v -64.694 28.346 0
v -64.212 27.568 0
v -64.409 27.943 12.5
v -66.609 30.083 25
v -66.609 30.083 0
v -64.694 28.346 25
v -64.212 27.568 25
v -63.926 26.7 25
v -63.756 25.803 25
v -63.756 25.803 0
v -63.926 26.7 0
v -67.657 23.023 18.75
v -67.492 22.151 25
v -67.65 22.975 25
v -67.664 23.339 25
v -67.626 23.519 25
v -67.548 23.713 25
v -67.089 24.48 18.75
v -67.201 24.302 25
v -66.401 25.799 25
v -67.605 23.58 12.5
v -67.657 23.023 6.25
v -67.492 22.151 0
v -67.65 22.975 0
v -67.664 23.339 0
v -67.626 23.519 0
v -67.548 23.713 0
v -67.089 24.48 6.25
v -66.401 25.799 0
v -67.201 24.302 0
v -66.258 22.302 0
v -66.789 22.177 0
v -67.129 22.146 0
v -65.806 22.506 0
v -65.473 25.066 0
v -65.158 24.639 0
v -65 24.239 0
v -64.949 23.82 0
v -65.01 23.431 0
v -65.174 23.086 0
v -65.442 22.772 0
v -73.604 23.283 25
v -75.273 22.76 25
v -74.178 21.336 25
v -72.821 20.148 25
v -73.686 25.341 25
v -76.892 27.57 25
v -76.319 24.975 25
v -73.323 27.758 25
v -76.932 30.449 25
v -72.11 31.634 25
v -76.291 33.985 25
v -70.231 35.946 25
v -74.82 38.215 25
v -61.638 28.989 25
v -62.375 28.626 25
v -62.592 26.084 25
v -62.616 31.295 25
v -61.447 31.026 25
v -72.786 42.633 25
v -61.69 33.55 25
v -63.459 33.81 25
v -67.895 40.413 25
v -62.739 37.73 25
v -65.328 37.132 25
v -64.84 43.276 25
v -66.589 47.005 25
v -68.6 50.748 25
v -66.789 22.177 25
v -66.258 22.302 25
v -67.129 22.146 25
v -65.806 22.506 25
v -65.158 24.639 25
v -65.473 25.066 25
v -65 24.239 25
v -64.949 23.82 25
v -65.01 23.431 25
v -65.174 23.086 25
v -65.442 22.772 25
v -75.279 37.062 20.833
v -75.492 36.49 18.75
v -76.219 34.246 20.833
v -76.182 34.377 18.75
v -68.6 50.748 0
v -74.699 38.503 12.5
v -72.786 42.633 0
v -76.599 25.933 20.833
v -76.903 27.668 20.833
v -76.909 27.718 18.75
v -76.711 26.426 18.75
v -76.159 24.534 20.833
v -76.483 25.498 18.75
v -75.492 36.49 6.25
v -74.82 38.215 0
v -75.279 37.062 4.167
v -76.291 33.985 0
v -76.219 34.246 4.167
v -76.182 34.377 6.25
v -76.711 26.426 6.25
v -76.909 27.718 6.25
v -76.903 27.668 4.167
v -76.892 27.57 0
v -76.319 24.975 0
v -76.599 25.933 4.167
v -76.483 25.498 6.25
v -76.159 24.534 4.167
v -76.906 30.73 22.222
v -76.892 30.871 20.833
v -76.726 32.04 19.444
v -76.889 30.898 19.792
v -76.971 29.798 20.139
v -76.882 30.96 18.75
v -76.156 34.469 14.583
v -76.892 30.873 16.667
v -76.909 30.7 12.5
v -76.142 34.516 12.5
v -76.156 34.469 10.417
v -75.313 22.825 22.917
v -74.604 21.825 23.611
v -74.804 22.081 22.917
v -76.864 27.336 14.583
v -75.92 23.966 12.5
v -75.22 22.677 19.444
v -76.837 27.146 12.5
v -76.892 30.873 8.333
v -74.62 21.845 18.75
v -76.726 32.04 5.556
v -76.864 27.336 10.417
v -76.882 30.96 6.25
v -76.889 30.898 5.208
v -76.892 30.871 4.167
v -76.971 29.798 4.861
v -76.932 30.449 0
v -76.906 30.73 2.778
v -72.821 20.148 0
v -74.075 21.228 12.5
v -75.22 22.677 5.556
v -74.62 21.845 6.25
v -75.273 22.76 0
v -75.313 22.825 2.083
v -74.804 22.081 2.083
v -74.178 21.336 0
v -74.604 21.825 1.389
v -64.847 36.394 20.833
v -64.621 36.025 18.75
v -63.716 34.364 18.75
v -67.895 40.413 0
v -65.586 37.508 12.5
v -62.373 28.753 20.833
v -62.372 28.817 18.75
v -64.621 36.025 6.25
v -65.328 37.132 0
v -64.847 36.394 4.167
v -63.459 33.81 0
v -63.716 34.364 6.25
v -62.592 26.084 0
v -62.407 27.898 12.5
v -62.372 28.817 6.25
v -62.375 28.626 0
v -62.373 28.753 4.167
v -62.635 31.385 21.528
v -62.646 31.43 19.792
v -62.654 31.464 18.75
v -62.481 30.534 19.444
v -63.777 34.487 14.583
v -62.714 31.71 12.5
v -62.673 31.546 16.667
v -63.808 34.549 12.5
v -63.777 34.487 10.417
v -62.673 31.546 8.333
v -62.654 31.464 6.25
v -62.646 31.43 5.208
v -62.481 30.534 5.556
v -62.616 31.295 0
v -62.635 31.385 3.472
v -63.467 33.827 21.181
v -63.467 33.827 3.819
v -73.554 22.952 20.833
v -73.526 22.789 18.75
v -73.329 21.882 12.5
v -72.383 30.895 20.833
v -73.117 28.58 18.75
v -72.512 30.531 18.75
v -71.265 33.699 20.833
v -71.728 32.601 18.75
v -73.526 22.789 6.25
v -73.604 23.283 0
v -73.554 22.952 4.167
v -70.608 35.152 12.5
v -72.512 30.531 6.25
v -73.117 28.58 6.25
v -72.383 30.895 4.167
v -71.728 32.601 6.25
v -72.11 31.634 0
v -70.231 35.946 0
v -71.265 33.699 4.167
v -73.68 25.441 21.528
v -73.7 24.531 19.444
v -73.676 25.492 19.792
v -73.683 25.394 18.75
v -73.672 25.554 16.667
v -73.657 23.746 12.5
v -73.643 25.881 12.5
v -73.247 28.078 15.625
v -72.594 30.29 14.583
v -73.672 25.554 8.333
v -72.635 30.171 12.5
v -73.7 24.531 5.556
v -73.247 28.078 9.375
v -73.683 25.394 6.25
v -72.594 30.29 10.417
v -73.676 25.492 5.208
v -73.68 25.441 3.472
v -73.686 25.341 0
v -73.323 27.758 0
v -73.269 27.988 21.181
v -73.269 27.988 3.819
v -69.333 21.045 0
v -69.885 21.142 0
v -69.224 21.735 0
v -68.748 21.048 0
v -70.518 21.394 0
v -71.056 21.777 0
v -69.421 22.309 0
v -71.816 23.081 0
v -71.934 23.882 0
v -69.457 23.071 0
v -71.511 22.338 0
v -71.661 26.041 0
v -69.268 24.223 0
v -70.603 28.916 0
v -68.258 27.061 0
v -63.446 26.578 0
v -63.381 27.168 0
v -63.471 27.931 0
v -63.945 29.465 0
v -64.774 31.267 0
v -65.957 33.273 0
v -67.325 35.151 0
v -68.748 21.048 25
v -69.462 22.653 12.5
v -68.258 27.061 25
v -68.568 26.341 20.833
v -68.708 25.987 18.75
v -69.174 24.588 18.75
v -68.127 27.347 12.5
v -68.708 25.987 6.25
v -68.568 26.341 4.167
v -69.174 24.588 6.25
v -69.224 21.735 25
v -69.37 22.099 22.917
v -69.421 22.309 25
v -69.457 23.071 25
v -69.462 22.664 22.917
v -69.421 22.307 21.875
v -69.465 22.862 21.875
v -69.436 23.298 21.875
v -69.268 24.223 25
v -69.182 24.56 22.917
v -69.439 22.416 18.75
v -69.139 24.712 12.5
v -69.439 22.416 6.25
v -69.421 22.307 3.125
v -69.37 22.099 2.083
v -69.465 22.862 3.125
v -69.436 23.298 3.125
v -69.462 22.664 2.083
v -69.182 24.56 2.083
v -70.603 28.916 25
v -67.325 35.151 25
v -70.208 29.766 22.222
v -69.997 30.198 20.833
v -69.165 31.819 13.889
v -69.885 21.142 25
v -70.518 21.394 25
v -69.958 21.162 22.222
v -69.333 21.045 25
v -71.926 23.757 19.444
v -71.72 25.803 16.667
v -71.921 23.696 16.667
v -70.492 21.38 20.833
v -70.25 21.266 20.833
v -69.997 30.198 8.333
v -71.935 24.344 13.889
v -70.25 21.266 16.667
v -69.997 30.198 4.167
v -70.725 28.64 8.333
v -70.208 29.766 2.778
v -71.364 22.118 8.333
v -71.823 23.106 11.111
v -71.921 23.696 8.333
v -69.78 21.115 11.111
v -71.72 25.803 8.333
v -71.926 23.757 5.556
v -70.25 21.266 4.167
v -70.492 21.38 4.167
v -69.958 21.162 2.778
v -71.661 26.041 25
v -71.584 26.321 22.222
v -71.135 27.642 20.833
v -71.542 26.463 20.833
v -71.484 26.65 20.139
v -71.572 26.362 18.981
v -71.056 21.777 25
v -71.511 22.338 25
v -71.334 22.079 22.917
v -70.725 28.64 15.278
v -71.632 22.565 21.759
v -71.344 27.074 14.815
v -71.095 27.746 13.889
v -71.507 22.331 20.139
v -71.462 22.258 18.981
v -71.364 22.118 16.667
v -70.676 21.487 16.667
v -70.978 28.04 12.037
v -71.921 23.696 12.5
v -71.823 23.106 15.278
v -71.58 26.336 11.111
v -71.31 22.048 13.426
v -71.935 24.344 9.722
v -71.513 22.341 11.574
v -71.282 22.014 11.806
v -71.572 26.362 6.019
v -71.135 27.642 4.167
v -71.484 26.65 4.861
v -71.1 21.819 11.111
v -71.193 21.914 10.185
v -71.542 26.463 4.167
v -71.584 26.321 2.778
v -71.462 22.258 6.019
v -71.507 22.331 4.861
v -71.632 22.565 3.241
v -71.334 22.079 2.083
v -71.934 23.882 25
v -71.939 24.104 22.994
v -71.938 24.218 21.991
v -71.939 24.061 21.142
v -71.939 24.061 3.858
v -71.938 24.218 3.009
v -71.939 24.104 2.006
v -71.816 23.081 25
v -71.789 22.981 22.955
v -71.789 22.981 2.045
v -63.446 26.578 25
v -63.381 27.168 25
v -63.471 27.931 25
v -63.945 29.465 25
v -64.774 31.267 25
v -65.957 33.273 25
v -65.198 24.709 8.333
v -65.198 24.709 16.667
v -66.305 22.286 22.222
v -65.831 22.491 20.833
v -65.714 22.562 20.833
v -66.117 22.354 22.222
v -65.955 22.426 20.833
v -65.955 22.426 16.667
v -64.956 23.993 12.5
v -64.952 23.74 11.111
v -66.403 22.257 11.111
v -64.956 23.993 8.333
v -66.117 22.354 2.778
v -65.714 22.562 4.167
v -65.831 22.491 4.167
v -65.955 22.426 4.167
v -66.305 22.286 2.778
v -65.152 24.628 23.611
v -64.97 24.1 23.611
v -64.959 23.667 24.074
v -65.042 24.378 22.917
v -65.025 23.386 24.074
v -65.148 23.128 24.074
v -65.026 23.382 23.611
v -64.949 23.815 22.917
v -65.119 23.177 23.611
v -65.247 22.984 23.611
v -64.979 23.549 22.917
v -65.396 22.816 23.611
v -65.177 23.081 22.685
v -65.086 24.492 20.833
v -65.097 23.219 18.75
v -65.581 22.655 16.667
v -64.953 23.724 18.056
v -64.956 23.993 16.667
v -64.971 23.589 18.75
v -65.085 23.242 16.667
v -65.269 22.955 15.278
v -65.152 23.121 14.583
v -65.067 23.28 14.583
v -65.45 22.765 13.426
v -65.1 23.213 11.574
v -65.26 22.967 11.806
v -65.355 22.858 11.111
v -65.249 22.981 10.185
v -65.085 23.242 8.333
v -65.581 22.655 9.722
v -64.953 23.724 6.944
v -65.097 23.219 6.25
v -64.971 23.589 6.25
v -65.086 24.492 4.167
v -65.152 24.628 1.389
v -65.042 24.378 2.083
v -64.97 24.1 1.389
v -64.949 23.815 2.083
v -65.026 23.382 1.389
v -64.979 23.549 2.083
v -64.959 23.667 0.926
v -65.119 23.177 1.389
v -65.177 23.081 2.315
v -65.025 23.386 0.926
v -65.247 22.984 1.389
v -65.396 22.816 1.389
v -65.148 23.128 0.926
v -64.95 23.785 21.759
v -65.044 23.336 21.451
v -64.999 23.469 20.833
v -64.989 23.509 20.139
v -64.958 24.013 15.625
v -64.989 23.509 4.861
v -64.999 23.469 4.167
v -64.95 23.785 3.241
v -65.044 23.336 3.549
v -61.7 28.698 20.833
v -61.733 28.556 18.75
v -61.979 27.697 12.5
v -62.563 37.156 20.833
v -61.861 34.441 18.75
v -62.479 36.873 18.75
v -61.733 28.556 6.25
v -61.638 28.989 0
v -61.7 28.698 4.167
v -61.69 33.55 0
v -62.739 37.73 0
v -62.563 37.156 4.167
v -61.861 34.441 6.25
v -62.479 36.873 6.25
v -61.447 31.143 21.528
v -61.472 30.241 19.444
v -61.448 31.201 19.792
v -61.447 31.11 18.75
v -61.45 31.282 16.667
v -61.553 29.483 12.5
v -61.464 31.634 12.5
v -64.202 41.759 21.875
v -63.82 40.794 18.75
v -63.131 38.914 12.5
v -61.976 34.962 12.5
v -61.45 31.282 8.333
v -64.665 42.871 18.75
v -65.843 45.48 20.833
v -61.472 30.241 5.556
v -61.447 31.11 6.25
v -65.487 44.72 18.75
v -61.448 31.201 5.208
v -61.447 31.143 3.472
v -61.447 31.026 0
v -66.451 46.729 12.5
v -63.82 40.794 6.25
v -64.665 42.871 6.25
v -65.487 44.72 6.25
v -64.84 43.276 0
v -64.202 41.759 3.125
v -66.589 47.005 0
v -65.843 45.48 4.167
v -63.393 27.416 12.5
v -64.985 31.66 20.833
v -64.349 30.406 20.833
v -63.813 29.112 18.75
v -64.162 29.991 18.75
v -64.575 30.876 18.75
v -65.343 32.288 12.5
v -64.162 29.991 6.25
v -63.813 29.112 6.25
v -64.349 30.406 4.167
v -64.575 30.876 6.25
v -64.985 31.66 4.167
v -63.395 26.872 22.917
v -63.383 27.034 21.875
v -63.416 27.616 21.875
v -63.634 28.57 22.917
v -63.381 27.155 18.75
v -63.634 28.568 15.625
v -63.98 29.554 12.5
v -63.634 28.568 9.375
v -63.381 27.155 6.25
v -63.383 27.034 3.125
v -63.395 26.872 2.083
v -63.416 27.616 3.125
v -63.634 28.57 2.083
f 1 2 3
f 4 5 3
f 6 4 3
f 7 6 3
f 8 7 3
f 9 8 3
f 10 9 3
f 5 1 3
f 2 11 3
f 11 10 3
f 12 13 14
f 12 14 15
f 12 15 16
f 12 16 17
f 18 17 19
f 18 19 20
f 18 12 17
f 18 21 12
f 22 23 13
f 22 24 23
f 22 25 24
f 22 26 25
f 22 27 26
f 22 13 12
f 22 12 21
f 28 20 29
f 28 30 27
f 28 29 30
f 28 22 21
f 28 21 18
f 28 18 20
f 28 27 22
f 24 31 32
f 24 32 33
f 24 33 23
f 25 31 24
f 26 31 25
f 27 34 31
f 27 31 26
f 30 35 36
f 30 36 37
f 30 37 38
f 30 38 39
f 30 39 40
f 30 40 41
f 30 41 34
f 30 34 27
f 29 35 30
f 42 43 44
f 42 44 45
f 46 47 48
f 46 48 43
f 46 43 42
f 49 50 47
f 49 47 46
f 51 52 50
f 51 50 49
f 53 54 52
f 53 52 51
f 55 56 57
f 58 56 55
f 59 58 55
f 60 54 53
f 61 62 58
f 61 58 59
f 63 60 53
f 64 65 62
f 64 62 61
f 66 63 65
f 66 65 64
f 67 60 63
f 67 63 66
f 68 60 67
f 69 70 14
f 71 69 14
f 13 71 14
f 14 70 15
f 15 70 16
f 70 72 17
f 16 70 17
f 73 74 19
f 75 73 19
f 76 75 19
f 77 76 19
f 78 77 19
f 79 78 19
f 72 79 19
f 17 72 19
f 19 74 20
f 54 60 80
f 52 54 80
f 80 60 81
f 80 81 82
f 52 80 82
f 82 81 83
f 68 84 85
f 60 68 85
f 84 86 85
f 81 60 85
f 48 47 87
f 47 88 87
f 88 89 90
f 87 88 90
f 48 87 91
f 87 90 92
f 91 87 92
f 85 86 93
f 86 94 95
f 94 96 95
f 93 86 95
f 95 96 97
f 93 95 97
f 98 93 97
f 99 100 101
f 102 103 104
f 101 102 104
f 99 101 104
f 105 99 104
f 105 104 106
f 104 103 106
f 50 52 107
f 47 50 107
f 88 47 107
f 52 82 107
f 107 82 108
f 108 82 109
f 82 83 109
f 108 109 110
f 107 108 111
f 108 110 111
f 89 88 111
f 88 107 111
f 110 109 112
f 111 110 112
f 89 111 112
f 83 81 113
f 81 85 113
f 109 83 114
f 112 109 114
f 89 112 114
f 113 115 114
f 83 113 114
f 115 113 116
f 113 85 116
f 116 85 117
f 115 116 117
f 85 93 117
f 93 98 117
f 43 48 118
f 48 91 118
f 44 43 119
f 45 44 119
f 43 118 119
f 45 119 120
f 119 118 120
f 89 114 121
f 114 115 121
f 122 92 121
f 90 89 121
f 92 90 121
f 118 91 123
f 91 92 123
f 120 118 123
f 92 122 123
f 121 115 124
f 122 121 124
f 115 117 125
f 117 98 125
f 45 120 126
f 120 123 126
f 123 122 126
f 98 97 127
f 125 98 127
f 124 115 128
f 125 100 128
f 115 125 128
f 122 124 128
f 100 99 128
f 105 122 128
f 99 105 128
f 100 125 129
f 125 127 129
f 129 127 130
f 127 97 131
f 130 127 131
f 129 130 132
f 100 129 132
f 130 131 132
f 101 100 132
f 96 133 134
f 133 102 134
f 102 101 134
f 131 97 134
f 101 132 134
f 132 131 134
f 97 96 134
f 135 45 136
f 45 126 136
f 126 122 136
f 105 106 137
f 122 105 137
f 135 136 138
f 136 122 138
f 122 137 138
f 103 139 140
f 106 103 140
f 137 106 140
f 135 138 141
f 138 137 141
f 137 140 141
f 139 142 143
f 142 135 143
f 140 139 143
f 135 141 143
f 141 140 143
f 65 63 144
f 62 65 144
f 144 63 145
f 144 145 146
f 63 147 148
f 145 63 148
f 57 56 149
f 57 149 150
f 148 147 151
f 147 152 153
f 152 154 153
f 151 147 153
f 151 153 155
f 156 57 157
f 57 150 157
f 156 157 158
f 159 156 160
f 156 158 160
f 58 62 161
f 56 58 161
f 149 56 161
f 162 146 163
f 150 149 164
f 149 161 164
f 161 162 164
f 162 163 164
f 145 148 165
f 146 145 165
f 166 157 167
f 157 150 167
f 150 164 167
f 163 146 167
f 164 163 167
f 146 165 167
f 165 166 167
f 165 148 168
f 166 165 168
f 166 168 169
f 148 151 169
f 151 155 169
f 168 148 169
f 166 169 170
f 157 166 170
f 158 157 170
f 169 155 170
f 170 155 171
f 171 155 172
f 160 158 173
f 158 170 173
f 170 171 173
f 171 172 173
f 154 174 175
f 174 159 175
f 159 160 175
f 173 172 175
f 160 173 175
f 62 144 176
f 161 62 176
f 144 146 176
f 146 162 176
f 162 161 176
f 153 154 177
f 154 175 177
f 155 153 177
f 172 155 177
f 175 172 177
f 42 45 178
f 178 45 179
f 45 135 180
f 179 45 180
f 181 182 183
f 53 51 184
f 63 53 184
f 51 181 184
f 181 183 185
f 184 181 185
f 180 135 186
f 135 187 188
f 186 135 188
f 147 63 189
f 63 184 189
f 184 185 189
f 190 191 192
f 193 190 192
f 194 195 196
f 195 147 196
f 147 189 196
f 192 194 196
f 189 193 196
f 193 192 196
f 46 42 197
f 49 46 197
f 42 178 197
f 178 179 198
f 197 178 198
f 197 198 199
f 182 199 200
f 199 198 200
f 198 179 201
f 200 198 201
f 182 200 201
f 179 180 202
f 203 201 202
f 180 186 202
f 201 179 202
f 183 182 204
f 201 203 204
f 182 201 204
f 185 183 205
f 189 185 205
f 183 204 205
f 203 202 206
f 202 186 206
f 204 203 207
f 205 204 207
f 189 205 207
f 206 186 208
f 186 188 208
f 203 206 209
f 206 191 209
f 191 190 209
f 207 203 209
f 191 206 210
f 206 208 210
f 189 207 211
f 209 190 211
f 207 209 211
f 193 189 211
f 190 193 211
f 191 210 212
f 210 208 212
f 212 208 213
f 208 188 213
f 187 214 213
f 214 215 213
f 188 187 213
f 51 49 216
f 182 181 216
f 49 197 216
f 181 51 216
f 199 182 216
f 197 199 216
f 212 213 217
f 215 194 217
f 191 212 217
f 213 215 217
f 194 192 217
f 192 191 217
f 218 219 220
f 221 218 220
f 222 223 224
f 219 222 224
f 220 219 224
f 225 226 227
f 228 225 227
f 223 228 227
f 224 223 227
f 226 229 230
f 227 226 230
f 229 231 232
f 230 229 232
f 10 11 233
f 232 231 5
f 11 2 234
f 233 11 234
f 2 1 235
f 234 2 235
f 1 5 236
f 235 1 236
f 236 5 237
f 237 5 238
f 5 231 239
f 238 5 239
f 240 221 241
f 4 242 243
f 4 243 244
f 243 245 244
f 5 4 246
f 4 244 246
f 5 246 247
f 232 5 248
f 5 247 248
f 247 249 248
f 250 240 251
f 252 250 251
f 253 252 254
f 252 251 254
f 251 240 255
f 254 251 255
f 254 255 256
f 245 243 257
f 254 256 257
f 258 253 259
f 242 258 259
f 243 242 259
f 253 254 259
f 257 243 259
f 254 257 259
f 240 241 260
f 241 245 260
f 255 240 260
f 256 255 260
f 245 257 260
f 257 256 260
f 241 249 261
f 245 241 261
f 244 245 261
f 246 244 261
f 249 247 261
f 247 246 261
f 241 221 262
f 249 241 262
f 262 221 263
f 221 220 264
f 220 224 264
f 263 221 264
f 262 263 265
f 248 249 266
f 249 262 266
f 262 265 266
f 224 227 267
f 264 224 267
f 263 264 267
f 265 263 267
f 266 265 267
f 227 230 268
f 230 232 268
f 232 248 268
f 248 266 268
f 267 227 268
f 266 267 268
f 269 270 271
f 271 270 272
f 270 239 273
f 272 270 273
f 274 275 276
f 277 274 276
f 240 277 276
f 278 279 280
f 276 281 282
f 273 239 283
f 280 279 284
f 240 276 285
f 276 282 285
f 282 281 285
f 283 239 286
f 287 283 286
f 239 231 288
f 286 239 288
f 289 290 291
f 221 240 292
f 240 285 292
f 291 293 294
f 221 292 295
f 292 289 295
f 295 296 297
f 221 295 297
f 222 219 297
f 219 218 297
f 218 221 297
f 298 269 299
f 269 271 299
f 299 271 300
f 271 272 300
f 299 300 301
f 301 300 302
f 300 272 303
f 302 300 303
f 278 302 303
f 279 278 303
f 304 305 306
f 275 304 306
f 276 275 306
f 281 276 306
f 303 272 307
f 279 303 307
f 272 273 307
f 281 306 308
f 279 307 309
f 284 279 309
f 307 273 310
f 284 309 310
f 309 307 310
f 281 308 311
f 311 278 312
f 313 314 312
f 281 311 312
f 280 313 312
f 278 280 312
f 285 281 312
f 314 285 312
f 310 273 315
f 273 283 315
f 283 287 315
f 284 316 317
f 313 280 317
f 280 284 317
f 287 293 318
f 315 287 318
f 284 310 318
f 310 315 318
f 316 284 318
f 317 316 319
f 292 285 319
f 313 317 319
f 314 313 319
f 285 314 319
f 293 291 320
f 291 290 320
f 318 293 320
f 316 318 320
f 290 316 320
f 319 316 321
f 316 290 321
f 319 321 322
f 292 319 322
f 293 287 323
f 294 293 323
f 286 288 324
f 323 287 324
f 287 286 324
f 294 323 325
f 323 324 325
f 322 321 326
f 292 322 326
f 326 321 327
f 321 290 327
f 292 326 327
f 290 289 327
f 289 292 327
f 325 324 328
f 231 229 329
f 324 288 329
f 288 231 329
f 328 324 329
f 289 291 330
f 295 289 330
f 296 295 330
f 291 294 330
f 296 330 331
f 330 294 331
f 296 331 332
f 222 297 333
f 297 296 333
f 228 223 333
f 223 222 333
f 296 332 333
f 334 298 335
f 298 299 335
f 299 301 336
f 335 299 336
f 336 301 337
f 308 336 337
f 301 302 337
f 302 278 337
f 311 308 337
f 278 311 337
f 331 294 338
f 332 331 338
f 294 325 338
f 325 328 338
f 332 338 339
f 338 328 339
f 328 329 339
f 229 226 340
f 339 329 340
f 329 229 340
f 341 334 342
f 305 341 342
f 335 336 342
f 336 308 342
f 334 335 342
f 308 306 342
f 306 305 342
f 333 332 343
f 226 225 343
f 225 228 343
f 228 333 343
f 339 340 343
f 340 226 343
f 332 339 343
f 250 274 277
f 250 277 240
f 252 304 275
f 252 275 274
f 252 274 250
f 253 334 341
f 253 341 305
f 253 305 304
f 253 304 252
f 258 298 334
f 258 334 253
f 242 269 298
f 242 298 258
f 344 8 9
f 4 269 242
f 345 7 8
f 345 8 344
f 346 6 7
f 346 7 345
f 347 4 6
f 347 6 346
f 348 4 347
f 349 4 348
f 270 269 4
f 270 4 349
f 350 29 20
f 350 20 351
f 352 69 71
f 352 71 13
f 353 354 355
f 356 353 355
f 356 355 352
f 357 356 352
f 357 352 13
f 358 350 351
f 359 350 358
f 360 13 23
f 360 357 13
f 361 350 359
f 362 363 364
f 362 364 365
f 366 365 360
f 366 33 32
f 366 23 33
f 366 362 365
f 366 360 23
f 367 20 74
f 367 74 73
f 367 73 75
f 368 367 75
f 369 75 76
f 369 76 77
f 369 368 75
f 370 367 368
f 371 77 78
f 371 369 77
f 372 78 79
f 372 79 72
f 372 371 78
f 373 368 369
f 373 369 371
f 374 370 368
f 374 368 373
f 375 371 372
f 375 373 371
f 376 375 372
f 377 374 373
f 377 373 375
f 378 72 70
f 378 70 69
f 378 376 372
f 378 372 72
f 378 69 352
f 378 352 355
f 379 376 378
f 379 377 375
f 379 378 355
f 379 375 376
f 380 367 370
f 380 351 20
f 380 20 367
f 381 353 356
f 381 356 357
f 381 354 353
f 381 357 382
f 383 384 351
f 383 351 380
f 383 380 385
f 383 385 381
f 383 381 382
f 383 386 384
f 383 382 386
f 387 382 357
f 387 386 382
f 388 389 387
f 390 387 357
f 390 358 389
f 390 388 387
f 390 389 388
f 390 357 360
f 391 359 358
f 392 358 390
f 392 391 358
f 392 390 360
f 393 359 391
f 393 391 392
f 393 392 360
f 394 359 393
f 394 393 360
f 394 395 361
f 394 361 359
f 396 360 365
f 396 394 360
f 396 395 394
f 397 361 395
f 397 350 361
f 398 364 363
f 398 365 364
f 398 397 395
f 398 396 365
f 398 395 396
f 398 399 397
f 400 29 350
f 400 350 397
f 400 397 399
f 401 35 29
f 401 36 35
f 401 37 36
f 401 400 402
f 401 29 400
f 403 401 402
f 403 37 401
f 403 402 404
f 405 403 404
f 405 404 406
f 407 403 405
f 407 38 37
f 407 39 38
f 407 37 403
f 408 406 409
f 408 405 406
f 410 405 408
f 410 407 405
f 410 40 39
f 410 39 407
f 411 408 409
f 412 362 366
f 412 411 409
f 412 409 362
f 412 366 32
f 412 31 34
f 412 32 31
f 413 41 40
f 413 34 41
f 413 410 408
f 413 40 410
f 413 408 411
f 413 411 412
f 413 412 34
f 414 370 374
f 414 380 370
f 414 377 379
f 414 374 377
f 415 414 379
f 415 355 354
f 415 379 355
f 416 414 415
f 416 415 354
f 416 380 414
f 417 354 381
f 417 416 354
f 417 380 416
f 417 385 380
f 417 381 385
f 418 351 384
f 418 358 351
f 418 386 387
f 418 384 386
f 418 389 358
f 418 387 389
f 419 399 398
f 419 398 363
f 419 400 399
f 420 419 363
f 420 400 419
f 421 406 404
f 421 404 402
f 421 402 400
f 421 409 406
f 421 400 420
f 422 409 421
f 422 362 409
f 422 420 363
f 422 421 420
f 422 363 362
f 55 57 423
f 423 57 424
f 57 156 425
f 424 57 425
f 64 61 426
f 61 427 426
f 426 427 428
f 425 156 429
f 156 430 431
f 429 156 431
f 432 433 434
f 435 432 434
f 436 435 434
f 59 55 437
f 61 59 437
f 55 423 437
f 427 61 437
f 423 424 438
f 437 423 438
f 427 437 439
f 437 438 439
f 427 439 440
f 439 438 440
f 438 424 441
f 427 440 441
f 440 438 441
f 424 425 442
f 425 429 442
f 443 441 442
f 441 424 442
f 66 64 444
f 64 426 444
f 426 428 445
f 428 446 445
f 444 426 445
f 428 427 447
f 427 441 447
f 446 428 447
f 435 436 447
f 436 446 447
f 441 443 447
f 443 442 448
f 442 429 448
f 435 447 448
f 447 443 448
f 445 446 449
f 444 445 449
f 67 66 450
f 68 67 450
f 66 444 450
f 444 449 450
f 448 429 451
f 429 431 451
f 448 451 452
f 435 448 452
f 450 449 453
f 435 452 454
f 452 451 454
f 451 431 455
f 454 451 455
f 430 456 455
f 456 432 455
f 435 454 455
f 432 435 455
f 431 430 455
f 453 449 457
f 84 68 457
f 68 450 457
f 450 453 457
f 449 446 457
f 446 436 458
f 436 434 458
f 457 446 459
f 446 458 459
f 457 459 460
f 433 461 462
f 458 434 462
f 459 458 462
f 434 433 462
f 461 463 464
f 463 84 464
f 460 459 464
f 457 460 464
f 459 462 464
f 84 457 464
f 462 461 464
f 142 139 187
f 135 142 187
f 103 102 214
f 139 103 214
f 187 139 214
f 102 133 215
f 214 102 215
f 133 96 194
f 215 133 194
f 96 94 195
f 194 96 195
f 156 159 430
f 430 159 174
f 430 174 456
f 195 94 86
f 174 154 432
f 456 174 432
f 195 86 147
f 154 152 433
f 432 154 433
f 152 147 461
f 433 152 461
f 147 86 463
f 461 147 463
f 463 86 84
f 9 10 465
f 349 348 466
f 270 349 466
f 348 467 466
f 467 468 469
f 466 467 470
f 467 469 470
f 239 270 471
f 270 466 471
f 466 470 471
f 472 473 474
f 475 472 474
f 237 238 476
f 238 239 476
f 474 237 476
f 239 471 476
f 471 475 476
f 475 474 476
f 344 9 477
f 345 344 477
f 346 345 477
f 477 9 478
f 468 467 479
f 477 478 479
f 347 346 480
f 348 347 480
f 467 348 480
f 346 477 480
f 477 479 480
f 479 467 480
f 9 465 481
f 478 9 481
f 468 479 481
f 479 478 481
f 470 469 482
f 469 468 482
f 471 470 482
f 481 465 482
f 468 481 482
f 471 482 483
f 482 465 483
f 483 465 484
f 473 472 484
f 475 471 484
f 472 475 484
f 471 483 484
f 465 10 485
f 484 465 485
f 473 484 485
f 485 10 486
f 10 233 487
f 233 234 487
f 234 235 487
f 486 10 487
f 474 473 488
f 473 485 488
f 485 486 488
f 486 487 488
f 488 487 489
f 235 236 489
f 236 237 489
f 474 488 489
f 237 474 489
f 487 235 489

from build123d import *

# Parameters (mm, degrees)
F1_DEPTH = 25


with BuildPart() as f1:
    # F0 (on Top) → F1 (new body)
    with BuildSketch(Plane.XY):
        with BuildLine():
            add(Edge.make_bspline(
                [(-62.5923201442, 26.0836202651), (-61.9351901808, 27.6738730732), (-60.1939110476, 32.2015343839), (-64.5900815725, 43.7468290329), (-68.6000138521, 50.7481247187)],
                knots=[0, 0, 0, 0, 0.3450779004, 1, 1, 1, 1], degree=3))
            add(Edge.make_bspline(
                [(-68.6000138521, 50.7481247187), (-72.2092464566, 43.649148196), (-79.2907851994, 31.8031692569), (-75.9211406112, 22.3545692861), (-72.8206783533, 20.1483108103)],
                knots=[0, 0, 0, 0, 0.5806848058, 1, 1, 1, 1], degree=3))
            add(Edge.make_bspline(
                [(-72.8206783533, 20.1483108103), (-73.3673278597, 21.8629082153), (-74.7220440755, 26.3600017196), (-70.8417072892, 35.1508520544), (-67.8950101137, 40.4130443931)],
                knots=[0, 0, 0, 0, 0.3784090051, 1, 1, 1, 1], degree=3))
            add(Edge.make_bspline(
                [(-67.8950101137, 40.4130443931), (-65.3715357184, 37.5928916037), (-61.9560712548, 32.0747531141), (-62.366534646, 27.8978623447), (-62.5923201442, 26.0836202651)],
                knots=[0, 0, 0, 0, 0.5729292116, 1, 1, 1, 1], degree=3))
        make_face()
    extrude(amount=F1_DEPTH)


with BuildPart() as f1b:
    # F0 (on Top) → F1, piece 2 (new body)
    with BuildSketch(Plane.XY):
        with BuildLine():
            add(Edge.make_bspline(
                [(-63.7555196881, 25.8029252291), (-63.5293067352, 26.2513958143), (-62.8671172852, 27.6668608362), (-65.0851428509, 32.3803760111), (-67.3251673579, 35.1508520544)],
                knots=[0, 0, 0, 0, 0.3038872696, 1, 1, 1, 1], degree=3))
            add(Edge.make_bspline(
                [(-67.3251673579, 35.1508520544), (-69.2089361234, 31.8049107249), (-72.2356221362, 26.3714943322), (-71.9277775534, 21.8582907482), (-69.8236301541, 20.9478344768), (-68.7484294176, 21.0477747023)],
                knots=[0, 0, 0, 0, 0.4713171, 0.7534900214, 1, 1, 1, 1], degree=3))
            add(Edge.make_bspline(
                [(-68.7484294176, 21.0477747023), (-69.0955745928, 21.4823009731), (-70.119719912, 22.7706684321), (-68.319350481, 27.4538528174), (-66.6086152196, 30.0825629383)],
                knots=[0, 0, 0, 0, 0.3196111445, 1, 1, 1, 1], degree=3))
            add(Edge.make_bspline(
                [(-66.6086152196, 30.0825629383), (-65.7466496453, 29.4021985077), (-64.1486329252, 28.1408560965), (-63.8794884265, 26.5401945771), (-63.7555196881, 25.8029252291)],
                knots=[0, 0, 0, 0, 0.5393970936, 1, 1, 1, 1], degree=3))
        make_face()
    extrude(amount=F1_DEPTH)


with BuildPart() as f1c:
    # F0 (on Top) → F1, piece 3 (new body)
    with BuildSketch(Plane.XY):
        with BuildLine():
            add(Edge.make_bspline(
                [(-67.4919933081, 22.1512597054), (-67.6424205303, 22.9410082102), (-67.8774463812, 23.5652205007), (-66.8150708079, 24.7461460531), (-66.4013922215, 25.7991440594)],
                knots=[0, 0, 0, 0, 0.4297455601, 1, 1, 1, 1], degree=3))
            add(Edge.make_bspline(
                [(-66.4013922215, 25.7991440594), (-65.9411160041, 25.4893987375), (-65.0267468122, 24.8544525706), (-64.7357526007, 22.9844369821), (-66.2885680795, 22.0760460943), (-67.4919933081, 22.1512597054)],
                knots=[0, 0, 0, 0, 0.3098610978, 0.6047579994, 1, 1, 1, 1], degree=3))
        make_face()
    extrude(amount=F1_DEPTH)


solid = Compound([f1.part, f1b.part, f1c.part])
